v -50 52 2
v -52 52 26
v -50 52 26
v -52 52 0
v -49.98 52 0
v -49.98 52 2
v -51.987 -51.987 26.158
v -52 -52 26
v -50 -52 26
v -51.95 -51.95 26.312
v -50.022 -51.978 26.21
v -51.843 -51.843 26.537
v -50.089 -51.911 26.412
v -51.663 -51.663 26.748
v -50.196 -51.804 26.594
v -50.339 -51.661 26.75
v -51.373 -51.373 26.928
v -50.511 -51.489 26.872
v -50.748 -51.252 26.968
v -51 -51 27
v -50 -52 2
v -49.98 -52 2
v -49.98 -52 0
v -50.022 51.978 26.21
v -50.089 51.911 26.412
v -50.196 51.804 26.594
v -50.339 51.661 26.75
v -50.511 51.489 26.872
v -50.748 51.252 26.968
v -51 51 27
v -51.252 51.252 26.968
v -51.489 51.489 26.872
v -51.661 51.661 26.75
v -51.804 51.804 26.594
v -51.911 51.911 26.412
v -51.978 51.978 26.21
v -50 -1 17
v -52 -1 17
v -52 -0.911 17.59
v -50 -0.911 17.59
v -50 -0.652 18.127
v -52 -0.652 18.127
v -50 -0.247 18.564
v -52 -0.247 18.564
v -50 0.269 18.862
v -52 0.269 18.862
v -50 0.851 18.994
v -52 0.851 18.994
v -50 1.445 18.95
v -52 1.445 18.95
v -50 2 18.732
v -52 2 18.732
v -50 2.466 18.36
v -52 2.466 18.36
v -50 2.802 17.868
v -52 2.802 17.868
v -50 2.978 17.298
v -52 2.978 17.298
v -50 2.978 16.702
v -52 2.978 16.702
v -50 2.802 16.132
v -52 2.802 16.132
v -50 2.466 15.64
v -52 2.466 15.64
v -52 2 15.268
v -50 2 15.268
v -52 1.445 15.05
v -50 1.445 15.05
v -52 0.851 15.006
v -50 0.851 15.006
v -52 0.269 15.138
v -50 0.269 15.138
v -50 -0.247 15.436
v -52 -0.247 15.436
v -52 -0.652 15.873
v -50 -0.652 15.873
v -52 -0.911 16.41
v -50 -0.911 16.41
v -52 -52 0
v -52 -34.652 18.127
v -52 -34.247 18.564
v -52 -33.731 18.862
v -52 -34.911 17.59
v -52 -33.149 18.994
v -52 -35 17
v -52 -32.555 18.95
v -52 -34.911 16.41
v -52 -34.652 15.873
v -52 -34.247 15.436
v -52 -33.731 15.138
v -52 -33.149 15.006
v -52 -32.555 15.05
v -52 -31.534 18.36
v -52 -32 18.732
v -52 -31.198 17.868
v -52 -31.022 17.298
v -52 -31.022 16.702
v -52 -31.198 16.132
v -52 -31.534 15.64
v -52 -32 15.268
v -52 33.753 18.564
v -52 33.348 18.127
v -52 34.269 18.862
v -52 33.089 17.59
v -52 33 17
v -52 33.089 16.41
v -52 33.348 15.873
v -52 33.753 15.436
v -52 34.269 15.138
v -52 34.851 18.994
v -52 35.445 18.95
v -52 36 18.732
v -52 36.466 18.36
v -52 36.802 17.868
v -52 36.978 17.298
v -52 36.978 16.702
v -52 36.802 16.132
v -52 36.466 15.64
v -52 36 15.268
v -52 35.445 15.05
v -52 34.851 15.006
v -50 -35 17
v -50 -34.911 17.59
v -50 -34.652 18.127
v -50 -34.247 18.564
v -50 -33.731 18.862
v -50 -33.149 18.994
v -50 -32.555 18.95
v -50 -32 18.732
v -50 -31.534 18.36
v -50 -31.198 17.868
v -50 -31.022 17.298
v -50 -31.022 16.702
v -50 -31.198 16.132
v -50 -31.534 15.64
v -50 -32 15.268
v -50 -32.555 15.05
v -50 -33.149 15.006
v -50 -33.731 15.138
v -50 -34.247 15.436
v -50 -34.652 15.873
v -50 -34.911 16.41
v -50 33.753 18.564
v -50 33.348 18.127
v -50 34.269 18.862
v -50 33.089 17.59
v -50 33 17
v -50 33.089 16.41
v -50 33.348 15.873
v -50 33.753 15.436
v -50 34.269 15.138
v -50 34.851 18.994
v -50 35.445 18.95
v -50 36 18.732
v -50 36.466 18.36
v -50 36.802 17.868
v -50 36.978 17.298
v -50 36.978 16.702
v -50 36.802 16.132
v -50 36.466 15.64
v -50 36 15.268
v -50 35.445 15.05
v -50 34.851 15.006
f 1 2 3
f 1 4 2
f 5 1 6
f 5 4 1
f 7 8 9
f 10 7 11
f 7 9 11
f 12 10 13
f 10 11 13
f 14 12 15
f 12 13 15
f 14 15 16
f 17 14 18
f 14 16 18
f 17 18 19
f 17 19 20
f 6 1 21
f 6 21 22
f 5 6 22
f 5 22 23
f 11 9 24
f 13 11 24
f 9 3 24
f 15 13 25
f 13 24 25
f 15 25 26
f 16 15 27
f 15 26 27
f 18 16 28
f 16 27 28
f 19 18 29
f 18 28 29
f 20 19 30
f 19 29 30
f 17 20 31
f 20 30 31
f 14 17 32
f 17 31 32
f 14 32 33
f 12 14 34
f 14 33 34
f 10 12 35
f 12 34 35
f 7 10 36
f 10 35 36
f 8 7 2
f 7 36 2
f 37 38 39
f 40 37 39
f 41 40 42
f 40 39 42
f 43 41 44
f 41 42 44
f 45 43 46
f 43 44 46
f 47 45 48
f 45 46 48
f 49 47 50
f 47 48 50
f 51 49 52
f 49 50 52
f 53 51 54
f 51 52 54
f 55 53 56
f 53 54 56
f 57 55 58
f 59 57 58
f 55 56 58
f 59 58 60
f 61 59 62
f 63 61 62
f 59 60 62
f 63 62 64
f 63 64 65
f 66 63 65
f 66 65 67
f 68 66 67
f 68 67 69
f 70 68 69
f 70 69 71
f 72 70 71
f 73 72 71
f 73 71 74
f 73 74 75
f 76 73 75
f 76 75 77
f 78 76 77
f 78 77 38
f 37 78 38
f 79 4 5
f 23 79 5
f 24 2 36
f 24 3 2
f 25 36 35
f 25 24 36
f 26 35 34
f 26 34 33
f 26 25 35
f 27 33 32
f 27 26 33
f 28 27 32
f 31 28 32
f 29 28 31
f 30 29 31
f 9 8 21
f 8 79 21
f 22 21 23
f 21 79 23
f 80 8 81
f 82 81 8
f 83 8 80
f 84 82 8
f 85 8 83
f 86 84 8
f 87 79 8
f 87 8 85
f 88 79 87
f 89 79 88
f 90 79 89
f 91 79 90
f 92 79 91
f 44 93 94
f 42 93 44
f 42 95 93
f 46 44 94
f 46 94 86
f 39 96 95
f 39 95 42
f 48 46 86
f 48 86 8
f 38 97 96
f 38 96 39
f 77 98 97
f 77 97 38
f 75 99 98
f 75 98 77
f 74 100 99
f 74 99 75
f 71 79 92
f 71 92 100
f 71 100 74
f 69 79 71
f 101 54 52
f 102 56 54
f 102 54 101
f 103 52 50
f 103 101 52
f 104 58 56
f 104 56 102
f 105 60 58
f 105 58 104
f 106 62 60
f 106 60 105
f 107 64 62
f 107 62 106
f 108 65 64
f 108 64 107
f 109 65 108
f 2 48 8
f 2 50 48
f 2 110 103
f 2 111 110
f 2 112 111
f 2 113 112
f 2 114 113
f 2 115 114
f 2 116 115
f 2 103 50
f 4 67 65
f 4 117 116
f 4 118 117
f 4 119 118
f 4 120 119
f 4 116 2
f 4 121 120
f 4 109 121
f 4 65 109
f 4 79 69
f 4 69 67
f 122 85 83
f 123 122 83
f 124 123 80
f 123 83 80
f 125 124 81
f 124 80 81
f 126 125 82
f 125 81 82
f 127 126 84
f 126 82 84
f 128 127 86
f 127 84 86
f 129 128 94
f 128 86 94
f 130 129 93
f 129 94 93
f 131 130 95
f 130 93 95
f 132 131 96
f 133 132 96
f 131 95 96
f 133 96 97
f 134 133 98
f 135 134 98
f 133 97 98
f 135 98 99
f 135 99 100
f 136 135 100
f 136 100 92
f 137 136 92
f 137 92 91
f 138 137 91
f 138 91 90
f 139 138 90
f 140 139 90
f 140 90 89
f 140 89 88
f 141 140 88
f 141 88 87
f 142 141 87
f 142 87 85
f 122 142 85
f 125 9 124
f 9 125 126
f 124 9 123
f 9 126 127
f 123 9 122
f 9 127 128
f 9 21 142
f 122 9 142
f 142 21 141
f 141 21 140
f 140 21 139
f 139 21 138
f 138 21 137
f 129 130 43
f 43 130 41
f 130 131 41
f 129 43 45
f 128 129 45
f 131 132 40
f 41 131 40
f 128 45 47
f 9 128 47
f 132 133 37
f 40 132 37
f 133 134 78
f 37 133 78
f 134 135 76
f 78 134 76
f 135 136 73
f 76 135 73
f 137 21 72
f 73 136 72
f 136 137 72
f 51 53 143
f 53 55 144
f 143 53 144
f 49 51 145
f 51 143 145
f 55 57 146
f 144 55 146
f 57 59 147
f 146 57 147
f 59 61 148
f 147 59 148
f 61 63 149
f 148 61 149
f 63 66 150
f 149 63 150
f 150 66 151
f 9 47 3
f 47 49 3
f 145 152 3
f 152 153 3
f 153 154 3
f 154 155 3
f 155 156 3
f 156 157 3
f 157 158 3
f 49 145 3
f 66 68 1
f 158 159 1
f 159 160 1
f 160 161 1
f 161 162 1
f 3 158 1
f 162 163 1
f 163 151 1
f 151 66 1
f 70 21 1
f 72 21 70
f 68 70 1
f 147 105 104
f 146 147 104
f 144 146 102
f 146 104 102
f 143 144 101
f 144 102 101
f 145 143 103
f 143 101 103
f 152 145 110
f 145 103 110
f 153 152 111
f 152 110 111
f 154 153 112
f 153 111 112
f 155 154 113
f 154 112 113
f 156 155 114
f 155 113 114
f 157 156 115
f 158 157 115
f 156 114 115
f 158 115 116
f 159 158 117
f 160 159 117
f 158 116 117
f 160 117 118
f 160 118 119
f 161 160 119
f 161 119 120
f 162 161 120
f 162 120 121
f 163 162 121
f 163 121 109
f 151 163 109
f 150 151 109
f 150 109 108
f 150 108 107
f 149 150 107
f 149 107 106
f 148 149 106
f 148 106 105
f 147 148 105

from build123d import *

# Parameters (mm, degrees)
F0_W      = 104
F0_H      = 104
F1_DEPTH  = 2
F2_W      = 2
F2_H      = 104
F3_DEPTH  = 25
F4_W      = 2
F4_H      = 104
F5_DEPTH  = 25
F6_R      = 0.99999
F7_R      = 0.99999
F9_D      = 4
F11_D     = 4
F13_D     = 4
F15_DEPTH = 500
F16_DEPTH = 505


# Not quite as in the source:
# - a fillet or chamfer is up to 0.001 mm smaller than in the source, because OpenCascade refuses the exact size


with BuildPart() as f1:
    # F0 (on Top) → F1 (new body)
    with BuildSketch(Plane.XY):
        Rectangle(F0_W, F0_H)
    extrude(amount=F1_DEPTH)

    # F2 (on face) → F3 (join)
    with BuildSketch(Plane.XY.offset(2)):
        with Locations((-51, 0)):
            Rectangle(F2_W, F2_H)
    extrude(amount=F3_DEPTH)

    # F4 (on face) → F5 (join)
    with BuildSketch(Plane.XY.offset(2)):
        with Locations((51, 0)):
            Rectangle(F4_W, F4_H)
    extrude(amount=F5_DEPTH)

    # F6 (radius 1 in the source; OpenCascade refuses exactly that, so slightly less here)
    f6_edges = [f1.edges().sort_by_distance(p)[0] for p in [
        (52, 0, 27),
        (51, 52, 27),
        (50, 0, 27),
        (51, -52, 27),
    ]]
    fillet(f6_edges, radius=F6_R)

    # F7 (radius 1 in the source; OpenCascade refuses exactly that, so slightly less here)
    f7_edges = [f1.edges().sort_by_distance(p)[0] for p in [
        (-51, 52, 27),
        (-52, 0, 27),
        (-51, -52, 27),
        (-50, 0, 27),
    ]]
    fillet(f7_edges, radius=F7_R)

    # F9 (through all)
    with Locations(Plane.YZ.offset(52)):
        with Locations((-33, 17)):
            Hole(F9_D / 2)

    # F11 (through all)
    with Locations(Plane.YZ.offset(52)):
        with Locations((1, 17)):
            Hole(F11_D / 2)

    # F13 (through all)
    with Locations(Plane.YZ.offset(52)):
        with Locations((35, 17)):
            Hole(F13_D / 2)

    # F14 (on Front) → F15 (cut)
    with BuildSketch(Plane.XZ):
        Polygon((74.380248785, 39.0327088535), (-49.979981035, 2.7150458191), (-49.979981035, 0), (-49.979981035, -1.495702425), (74.380248785, -1.495702425), align=None)
    extrude(amount=F15_DEPTH, mode=Mode.SUBTRACT)

    # F14 (on Front) → F16 (cut)
    with BuildSketch(Plane.XZ):
        Polygon((74.380248785, 39.0327088535), (-49.979981035, 2.7150458191), (-49.979981035, 0), (-49.979981035, -1.495702425), (74.380248785, -1.495702425), align=None)
    extrude(amount=-F16_DEPTH, mode=Mode.SUBTRACT)


solid = f1.part
